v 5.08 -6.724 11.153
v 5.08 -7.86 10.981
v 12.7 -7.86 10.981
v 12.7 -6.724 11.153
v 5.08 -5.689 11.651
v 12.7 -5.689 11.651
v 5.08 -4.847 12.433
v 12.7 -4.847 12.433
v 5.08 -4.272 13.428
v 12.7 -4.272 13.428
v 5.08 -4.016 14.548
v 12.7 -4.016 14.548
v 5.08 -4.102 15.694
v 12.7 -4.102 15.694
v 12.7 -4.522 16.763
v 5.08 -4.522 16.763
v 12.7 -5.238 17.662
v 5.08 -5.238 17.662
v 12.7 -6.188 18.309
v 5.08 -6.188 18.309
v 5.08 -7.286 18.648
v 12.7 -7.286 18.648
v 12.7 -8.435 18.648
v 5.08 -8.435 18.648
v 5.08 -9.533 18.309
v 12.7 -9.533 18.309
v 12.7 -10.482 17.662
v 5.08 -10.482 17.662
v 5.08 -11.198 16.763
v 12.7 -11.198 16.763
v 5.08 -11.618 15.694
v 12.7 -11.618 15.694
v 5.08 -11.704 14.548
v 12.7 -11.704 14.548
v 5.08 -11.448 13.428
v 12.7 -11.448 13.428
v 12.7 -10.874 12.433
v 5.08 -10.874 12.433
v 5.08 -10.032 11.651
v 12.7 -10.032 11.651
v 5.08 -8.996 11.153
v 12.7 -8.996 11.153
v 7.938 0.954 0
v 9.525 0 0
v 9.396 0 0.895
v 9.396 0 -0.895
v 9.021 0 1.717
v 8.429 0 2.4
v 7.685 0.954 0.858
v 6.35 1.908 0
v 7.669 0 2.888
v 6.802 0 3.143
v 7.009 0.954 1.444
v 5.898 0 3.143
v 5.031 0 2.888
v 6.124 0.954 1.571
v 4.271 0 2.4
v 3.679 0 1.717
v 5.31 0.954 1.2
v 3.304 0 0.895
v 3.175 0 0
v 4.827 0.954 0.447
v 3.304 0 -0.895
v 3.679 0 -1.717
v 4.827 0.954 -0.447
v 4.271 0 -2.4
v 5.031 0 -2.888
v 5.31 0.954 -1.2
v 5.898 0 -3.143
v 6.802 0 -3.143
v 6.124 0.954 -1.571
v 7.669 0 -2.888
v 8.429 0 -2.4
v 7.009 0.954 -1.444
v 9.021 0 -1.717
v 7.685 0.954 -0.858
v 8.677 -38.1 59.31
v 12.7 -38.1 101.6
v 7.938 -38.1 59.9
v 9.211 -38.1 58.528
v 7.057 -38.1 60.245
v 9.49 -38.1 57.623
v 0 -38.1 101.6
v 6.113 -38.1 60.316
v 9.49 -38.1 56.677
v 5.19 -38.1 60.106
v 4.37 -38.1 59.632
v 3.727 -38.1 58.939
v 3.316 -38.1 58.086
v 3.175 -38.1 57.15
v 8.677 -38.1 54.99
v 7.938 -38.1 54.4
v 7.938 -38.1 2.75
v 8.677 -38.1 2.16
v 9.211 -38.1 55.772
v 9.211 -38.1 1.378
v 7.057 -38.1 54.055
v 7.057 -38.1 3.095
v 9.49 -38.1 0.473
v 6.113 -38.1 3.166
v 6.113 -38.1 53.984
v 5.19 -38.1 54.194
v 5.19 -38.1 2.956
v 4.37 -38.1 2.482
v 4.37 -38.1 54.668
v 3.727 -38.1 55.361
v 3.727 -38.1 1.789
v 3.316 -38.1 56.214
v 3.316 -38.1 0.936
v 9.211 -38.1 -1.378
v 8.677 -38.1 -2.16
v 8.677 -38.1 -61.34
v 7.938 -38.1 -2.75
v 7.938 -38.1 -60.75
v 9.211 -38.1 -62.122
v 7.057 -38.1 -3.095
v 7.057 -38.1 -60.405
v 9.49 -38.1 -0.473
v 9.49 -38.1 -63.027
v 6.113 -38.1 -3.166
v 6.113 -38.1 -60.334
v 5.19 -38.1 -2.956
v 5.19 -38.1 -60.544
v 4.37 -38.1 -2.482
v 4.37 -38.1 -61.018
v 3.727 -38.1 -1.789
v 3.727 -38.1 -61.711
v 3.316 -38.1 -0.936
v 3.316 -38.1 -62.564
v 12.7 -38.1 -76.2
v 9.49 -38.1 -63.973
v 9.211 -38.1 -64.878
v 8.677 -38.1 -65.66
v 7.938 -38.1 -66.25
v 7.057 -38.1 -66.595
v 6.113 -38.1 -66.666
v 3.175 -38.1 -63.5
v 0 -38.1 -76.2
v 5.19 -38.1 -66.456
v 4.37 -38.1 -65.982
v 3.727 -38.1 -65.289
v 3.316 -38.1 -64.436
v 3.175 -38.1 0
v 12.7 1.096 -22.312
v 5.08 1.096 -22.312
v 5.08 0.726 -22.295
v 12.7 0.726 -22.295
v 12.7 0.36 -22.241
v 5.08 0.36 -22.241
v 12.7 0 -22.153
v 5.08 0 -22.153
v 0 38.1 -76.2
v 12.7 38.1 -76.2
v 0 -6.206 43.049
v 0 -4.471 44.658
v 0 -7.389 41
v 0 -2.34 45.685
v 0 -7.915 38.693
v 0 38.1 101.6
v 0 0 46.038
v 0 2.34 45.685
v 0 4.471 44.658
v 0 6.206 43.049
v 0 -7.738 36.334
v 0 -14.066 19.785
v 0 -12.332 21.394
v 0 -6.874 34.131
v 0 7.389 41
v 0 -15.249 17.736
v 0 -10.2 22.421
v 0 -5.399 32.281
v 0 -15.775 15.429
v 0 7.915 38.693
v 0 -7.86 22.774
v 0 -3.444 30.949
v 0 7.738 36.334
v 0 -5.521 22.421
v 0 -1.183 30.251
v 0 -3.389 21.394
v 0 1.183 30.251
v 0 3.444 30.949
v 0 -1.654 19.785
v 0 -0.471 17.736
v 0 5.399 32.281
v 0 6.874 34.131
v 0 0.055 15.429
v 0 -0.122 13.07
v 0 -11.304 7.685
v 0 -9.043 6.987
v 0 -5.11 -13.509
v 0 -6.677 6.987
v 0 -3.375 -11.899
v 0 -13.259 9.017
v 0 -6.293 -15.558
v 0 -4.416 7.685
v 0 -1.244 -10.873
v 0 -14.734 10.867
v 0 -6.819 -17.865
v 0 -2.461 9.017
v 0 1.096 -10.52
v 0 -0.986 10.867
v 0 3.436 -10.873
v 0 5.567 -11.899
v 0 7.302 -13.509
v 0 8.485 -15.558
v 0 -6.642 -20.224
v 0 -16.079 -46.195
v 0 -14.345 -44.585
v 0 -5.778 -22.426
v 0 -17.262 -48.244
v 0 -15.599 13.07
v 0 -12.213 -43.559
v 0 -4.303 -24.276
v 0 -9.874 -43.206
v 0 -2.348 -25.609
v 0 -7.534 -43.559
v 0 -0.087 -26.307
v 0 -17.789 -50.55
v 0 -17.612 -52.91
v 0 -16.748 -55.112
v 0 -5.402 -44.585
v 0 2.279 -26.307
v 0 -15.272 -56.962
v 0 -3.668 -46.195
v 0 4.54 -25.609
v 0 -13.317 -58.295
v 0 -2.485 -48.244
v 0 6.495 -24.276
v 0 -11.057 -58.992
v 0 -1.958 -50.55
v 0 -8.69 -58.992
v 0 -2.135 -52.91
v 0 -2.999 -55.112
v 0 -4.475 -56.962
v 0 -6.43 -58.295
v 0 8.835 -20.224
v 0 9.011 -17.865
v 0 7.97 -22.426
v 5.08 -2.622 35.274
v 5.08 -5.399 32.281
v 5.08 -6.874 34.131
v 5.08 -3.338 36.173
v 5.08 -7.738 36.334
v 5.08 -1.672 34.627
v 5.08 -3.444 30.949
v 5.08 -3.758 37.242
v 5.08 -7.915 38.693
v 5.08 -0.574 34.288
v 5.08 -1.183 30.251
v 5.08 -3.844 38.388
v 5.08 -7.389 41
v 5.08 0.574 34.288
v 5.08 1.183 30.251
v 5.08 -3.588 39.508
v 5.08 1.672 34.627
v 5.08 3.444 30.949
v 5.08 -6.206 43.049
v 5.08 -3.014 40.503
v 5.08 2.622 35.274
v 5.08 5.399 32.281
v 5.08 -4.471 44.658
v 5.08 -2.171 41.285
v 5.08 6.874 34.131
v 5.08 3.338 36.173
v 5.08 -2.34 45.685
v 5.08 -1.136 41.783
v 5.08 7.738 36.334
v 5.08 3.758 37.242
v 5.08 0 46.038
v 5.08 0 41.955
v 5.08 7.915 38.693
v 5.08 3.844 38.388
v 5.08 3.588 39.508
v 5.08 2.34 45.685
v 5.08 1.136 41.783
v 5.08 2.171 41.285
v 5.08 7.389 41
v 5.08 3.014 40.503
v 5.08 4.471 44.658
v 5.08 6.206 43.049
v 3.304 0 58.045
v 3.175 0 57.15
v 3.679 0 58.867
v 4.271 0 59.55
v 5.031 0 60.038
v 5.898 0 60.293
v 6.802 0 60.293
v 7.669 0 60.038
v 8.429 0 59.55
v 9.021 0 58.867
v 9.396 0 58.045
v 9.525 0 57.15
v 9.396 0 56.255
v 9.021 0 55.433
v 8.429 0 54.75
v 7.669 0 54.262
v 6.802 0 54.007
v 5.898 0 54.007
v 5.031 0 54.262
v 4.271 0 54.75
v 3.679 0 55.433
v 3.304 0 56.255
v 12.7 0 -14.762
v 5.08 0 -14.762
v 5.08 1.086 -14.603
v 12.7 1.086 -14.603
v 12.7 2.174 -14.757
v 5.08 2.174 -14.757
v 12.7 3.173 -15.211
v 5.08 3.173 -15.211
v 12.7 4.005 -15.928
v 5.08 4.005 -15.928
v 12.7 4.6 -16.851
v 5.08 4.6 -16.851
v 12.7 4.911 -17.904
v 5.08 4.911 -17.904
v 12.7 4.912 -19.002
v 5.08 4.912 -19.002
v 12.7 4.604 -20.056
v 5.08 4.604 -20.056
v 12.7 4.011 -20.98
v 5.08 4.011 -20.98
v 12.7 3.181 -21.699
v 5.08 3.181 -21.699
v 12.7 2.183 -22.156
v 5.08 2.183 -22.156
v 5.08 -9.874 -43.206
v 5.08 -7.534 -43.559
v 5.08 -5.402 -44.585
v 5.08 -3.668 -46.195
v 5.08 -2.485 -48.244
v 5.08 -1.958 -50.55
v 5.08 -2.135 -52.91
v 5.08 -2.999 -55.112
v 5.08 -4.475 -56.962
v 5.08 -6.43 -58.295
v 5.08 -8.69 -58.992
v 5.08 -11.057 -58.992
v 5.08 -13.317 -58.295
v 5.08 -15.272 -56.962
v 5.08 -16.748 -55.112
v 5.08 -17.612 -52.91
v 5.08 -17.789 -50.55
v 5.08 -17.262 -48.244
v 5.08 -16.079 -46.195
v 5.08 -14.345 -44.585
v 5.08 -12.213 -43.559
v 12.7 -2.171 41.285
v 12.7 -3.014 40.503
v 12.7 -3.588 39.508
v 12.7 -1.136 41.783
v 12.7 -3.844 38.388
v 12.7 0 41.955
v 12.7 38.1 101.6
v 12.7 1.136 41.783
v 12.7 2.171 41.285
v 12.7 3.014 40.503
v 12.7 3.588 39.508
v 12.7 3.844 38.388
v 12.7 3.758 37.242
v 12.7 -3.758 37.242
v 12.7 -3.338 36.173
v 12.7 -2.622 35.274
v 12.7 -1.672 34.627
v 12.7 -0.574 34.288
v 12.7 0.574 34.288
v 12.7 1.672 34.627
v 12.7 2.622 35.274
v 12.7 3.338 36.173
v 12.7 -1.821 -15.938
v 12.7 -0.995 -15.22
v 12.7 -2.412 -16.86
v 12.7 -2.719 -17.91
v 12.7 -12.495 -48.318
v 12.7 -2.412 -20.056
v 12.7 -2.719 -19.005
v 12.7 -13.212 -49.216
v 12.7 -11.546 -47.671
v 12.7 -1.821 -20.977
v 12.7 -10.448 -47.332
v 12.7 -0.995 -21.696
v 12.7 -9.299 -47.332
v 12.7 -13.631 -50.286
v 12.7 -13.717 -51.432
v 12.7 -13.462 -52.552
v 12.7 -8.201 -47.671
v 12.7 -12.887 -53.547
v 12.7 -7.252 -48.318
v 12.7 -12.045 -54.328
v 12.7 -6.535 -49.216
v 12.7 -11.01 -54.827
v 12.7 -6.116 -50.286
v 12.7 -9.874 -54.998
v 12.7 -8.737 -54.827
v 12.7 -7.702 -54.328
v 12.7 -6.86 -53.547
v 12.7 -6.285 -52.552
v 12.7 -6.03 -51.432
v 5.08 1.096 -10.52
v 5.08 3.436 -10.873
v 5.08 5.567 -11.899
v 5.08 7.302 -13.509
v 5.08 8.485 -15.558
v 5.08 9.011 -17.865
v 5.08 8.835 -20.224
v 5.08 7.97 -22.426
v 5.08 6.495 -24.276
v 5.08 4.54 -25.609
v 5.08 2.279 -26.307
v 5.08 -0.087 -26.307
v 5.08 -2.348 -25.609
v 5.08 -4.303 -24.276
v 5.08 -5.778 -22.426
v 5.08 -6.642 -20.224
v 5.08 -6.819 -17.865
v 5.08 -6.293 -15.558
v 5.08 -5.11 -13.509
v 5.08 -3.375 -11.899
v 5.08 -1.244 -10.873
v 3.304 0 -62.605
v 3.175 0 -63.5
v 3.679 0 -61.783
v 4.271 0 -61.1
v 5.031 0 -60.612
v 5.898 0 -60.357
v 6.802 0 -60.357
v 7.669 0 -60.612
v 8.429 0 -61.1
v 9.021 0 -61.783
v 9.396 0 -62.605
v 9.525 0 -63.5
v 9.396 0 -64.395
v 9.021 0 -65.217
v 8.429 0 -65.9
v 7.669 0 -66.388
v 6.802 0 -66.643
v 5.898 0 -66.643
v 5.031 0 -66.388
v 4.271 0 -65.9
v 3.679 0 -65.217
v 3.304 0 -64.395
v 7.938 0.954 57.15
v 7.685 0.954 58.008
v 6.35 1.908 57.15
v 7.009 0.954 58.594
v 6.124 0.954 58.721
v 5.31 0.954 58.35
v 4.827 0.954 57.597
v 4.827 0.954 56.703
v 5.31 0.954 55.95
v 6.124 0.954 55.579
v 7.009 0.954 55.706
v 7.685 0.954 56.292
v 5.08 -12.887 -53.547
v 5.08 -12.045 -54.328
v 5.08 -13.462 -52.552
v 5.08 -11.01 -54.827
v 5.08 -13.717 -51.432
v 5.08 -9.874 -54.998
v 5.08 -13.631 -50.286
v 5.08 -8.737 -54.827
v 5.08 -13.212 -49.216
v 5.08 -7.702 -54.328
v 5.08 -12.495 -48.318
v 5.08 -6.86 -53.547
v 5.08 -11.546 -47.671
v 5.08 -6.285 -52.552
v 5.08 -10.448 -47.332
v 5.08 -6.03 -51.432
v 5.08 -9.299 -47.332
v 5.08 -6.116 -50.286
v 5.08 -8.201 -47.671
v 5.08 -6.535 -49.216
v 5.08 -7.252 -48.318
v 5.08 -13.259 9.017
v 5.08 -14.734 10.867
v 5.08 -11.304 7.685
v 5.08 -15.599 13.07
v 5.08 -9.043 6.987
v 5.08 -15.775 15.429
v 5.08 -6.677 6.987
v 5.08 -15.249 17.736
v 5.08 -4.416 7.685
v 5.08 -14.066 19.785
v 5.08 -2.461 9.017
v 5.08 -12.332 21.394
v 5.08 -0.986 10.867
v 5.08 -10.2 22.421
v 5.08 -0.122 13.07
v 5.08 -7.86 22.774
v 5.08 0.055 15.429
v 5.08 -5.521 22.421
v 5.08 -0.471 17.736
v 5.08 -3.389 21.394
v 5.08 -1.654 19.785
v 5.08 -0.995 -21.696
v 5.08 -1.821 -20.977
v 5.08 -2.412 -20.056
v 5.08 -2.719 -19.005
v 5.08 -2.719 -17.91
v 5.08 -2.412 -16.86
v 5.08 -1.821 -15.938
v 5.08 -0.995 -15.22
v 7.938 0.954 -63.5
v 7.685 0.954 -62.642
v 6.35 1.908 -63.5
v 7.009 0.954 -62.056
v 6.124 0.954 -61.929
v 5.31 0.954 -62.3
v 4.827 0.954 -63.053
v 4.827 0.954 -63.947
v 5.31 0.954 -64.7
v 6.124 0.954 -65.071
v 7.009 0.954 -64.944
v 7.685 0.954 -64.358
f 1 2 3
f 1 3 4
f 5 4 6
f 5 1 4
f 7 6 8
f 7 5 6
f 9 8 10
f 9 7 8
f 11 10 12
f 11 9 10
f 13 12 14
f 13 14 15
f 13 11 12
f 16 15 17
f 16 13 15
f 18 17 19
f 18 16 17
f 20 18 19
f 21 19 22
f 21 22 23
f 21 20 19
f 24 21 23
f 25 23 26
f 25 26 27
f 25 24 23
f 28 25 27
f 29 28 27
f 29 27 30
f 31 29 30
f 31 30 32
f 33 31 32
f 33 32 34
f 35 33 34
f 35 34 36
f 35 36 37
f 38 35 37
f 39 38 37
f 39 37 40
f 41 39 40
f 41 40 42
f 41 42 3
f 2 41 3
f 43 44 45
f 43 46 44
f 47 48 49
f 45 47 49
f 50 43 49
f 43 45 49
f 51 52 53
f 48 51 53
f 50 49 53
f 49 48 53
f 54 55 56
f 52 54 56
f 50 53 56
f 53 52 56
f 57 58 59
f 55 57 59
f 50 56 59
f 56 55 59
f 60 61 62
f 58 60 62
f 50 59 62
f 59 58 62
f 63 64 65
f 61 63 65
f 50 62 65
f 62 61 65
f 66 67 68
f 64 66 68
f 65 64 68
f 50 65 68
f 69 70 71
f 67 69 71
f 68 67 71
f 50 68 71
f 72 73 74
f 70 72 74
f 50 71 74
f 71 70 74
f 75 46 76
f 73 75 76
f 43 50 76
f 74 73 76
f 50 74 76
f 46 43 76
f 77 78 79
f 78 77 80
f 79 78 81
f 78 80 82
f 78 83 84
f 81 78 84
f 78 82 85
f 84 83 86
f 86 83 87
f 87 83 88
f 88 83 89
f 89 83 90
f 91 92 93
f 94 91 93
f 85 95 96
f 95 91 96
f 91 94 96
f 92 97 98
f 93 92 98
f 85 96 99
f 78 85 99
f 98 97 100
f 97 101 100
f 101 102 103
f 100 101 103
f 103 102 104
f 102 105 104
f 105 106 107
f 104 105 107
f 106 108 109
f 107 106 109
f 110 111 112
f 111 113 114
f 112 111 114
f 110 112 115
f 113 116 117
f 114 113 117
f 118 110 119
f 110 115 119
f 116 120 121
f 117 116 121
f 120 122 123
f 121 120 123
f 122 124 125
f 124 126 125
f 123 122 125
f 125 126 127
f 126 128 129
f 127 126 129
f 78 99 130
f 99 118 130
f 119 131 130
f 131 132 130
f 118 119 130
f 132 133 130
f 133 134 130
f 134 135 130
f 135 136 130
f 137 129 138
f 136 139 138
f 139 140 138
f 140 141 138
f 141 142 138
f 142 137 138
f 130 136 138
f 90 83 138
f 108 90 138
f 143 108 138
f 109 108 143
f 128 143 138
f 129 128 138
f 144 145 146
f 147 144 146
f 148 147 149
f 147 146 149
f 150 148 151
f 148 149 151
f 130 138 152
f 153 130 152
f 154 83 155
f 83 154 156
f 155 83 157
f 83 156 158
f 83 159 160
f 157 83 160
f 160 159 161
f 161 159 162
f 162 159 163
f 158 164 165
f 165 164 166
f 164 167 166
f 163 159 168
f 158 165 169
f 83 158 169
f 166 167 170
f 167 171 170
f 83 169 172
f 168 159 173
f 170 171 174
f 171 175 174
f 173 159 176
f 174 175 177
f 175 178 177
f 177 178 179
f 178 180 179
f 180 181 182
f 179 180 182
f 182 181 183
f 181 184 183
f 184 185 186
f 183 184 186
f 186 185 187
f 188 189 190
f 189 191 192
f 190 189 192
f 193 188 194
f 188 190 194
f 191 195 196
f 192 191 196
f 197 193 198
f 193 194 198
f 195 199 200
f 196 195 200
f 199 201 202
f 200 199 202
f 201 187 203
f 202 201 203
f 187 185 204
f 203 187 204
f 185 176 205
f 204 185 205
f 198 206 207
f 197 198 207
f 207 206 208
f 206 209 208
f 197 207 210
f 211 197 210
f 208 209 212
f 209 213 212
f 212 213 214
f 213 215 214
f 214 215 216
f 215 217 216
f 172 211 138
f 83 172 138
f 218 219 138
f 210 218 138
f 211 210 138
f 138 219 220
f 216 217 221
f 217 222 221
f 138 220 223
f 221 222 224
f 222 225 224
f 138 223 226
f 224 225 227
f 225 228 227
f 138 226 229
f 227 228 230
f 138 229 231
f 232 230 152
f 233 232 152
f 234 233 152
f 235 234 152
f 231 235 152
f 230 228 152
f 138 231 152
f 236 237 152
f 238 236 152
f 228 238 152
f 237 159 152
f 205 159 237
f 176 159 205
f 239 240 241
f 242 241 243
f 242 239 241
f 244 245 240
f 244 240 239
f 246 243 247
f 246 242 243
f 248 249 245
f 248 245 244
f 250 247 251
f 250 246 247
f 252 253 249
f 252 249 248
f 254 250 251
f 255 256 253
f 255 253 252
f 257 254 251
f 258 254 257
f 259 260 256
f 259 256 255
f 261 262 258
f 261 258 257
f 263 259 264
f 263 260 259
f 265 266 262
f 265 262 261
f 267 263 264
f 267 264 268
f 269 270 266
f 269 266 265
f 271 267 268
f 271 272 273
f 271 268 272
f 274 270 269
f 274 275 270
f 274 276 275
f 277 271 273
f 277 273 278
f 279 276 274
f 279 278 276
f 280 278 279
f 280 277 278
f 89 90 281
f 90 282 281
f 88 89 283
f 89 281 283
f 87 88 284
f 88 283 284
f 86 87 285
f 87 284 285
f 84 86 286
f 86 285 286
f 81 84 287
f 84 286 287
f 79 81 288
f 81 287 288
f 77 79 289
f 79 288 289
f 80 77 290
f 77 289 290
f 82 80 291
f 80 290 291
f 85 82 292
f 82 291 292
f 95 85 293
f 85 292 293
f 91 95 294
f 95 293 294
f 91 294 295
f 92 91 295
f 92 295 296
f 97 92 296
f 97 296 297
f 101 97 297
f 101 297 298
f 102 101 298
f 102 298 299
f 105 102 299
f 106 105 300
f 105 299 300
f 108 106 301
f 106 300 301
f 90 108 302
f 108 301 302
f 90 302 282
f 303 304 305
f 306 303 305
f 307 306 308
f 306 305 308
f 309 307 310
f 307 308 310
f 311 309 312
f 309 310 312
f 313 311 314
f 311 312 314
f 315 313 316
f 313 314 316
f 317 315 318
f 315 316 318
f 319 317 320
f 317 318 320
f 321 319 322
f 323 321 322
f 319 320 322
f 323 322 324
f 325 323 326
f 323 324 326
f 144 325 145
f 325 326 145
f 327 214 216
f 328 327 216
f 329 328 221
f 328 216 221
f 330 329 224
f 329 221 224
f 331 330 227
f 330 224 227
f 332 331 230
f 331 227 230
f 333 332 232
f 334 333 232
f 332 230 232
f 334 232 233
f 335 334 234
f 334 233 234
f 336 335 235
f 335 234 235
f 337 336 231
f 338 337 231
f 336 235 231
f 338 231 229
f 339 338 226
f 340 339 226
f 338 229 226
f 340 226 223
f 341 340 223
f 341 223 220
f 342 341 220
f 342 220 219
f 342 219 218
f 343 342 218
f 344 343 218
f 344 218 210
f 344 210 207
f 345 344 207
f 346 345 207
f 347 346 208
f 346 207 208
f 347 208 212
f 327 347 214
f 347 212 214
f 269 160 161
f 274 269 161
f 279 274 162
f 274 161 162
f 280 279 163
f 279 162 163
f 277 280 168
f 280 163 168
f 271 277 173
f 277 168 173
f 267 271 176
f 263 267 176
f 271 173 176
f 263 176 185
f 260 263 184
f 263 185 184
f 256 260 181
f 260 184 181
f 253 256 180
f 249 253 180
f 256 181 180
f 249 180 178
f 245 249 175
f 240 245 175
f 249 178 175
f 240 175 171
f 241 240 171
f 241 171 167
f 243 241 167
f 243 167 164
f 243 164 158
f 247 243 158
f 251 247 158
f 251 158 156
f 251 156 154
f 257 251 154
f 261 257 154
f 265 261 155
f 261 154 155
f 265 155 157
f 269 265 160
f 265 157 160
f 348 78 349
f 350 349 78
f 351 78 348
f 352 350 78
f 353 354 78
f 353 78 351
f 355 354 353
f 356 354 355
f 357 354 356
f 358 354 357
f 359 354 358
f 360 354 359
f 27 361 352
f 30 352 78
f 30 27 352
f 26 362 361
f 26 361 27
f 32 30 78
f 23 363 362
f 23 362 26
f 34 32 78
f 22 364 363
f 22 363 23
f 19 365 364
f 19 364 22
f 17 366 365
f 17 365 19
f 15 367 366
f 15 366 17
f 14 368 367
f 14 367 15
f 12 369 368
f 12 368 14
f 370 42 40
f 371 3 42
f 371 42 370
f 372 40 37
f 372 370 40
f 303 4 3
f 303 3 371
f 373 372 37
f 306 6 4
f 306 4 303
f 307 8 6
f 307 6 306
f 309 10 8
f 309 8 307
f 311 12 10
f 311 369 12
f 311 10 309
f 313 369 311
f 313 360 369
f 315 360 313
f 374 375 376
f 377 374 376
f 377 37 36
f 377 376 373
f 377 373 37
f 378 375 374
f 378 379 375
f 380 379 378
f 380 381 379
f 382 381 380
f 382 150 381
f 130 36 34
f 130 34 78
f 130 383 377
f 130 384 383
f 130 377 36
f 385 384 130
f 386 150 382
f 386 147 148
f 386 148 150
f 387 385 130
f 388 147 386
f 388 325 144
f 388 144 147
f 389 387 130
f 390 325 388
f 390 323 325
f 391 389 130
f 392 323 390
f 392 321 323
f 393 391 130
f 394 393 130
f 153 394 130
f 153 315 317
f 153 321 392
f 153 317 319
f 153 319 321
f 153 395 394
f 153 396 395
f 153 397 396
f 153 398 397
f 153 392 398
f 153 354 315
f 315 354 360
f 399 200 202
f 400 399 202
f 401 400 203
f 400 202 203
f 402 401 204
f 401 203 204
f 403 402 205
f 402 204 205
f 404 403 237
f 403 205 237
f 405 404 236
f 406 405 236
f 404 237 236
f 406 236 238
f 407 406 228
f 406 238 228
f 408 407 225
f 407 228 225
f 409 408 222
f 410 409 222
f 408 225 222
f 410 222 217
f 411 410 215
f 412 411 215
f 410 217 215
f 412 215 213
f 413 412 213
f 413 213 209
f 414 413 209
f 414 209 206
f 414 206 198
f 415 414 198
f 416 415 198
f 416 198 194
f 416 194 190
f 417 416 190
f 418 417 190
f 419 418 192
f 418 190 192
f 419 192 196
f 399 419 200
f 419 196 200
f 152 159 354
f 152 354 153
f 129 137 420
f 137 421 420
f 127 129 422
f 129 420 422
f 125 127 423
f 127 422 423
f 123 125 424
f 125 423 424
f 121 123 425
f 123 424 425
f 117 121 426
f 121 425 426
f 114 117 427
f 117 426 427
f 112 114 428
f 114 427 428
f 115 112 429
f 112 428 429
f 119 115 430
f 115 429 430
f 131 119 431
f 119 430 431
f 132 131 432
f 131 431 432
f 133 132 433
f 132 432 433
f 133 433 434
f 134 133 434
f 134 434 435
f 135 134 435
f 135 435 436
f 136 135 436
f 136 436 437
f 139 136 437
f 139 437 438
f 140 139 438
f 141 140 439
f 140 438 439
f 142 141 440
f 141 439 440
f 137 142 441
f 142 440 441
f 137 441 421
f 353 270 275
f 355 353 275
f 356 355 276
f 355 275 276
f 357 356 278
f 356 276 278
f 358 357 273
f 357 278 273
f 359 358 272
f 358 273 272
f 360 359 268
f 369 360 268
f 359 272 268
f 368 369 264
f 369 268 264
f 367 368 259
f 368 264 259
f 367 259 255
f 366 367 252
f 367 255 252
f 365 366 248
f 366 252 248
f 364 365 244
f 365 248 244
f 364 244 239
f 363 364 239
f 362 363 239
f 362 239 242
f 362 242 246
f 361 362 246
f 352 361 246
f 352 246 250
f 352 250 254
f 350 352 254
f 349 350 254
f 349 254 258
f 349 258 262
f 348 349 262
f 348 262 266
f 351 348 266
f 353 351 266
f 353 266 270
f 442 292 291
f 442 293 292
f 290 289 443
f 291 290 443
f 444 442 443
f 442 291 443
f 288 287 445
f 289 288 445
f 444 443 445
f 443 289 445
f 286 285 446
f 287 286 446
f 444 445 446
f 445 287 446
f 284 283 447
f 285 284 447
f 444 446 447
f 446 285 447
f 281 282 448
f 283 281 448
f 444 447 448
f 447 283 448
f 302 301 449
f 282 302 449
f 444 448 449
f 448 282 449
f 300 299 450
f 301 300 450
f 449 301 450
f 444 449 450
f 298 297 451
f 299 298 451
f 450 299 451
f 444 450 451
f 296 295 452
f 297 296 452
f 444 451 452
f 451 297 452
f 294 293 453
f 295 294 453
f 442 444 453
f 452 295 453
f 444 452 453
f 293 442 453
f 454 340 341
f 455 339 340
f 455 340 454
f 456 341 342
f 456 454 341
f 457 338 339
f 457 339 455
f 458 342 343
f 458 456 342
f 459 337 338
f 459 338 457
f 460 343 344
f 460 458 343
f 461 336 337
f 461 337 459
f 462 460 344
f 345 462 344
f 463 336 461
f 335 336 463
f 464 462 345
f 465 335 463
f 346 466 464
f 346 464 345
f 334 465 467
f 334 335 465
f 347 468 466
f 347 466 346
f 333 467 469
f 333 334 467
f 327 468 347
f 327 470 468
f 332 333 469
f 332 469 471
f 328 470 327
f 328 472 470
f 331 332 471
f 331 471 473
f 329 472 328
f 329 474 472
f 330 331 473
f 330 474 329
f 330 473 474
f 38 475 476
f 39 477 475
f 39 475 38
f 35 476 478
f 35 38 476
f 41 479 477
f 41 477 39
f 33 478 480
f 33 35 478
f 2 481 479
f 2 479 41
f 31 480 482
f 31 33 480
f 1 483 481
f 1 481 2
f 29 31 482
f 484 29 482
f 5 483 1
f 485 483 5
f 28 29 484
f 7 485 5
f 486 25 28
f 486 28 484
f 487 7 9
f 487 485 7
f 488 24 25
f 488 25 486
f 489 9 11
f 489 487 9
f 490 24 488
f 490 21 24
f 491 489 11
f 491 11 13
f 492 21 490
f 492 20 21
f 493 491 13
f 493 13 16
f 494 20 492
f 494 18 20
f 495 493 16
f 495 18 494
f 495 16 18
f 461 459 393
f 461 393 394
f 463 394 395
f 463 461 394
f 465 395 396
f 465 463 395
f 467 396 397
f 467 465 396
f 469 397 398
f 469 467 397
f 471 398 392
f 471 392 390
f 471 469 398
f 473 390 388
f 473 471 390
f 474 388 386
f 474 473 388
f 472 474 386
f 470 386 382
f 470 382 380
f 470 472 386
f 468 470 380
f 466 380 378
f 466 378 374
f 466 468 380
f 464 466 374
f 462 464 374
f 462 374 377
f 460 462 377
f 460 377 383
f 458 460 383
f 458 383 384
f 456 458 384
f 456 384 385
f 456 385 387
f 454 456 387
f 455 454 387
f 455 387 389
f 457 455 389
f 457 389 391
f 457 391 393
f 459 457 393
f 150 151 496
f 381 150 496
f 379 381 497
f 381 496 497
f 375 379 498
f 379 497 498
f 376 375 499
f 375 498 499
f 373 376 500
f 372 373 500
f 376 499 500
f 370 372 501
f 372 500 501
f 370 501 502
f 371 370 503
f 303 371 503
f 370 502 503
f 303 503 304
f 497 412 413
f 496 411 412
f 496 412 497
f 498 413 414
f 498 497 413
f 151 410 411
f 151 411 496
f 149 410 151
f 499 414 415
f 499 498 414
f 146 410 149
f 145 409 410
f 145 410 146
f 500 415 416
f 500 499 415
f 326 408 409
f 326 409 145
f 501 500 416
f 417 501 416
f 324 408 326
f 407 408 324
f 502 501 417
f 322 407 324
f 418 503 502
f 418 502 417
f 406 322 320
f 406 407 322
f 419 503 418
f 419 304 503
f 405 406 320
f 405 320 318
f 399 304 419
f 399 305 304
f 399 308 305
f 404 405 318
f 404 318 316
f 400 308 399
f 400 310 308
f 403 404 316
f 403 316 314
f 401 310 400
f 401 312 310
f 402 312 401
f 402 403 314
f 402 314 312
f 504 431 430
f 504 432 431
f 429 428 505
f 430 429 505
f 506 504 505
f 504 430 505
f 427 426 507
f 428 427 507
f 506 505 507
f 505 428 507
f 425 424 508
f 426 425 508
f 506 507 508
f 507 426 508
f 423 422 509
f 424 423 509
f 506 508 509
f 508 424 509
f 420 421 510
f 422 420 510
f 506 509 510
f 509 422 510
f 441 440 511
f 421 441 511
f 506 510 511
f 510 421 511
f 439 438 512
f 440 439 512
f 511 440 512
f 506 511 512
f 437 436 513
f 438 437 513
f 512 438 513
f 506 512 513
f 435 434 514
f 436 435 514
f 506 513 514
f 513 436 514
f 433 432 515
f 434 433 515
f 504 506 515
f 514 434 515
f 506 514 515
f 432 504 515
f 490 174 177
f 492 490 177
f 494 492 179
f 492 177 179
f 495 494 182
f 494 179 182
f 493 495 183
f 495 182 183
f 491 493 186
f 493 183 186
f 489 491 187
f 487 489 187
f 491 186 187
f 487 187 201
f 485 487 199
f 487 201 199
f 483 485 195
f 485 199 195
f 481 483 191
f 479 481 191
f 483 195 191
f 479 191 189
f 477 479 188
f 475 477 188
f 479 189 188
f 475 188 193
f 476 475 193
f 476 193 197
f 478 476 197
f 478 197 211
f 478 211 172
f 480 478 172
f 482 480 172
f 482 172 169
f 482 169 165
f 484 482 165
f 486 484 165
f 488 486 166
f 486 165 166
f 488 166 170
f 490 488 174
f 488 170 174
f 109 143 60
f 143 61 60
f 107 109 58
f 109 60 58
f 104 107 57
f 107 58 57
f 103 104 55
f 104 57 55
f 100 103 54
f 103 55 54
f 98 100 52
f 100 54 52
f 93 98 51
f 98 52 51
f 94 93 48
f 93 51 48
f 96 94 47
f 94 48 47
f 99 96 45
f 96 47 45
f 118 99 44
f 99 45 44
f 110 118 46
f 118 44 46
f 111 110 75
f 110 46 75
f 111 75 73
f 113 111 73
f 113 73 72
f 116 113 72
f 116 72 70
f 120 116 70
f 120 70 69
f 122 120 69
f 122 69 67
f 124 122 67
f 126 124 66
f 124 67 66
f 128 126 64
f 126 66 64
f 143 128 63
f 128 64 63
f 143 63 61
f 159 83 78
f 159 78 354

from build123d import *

# Parameters (mm, degrees)
SKETCH1_W                       = 177.8
SKETCH1_H                       = 76.2
SKETCH1_R                       = 3.854557775
BOSS_EXTRUDE1_DEPTH             = 12.7
F_1_4_0_25_DIAMETER_HOLE2_D     = 6.35
F_1_4_0_25_DIAMETER_HOLE2_DEPTH = 38.1
F_1_4_0_25_DIAMETER_HOLE2_TIP   = 1.907732465
SKETCH2_R                       = 7.9375
CUT_EXTRUDE1_DEPTH              = 5.08


with BuildPart() as part:
    # Sketch1 → Boss-Extrude1 (new body)
    with BuildSketch(Plane(origin=(0, 0, 0), x_dir=(0, 0, -1), z_dir=(1, 0, 0))):
        with Locations((-12.7, 0)):
            Rectangle(SKETCH1_W, SKETCH1_H)
        with Locations((18.457733582, 1.096077429)):
            Circle(SKETCH1_R, mode=Mode.SUBTRACT)
        with Locations((-38.1, 0)):
            Circle(SKETCH1_R, mode=Mode.SUBTRACT)
        with Locations((-14.836022013, -7.860160654)):
            Circle(SKETCH1_R, mode=Mode.SUBTRACT)
        with Locations((51.143457994, -9.873506971)):
            Circle(SKETCH1_R, mode=Mode.SUBTRACT)
    extrude(amount=BOSS_EXTRUDE1_DEPTH)

    # 1/4 (0.25) Diameter Hole2
    with Locations(Plane.XZ.offset(38.1)):
        with Locations((6.35, 57.15), (6.35, -63.5), (6.35, 0)):
            Hole(F_1_4_0_25_DIAMETER_HOLE2_D / 2, depth=F_1_4_0_25_DIAMETER_HOLE2_DEPTH)
            with Locations((0, 0, -(F_1_4_0_25_DIAMETER_HOLE2_DEPTH + F_1_4_0_25_DIAMETER_HOLE2_TIP / 2))):  # 118° drill point
                Cone(0, F_1_4_0_25_DIAMETER_HOLE2_D / 2, F_1_4_0_25_DIAMETER_HOLE2_TIP, mode=Mode.SUBTRACT)

    # Sketch2 → Cut-Extrude1 (cut)
    with BuildSketch(Plane.ZY):
        with Locations((38.1, 0)):
            Circle(SKETCH2_R)
        with Locations((14.836022013, -7.860160654)):
            Circle(SKETCH2_R)
        with Locations((-18.457733582, 1.096077429)):
            Circle(SKETCH2_R)
        with Locations((-51.143457994, -9.873506971)):
            Circle(SKETCH2_R)
    extrude(amount=-CUT_EXTRUDE1_DEPTH, mode=Mode.SUBTRACT)


solid = part.part
